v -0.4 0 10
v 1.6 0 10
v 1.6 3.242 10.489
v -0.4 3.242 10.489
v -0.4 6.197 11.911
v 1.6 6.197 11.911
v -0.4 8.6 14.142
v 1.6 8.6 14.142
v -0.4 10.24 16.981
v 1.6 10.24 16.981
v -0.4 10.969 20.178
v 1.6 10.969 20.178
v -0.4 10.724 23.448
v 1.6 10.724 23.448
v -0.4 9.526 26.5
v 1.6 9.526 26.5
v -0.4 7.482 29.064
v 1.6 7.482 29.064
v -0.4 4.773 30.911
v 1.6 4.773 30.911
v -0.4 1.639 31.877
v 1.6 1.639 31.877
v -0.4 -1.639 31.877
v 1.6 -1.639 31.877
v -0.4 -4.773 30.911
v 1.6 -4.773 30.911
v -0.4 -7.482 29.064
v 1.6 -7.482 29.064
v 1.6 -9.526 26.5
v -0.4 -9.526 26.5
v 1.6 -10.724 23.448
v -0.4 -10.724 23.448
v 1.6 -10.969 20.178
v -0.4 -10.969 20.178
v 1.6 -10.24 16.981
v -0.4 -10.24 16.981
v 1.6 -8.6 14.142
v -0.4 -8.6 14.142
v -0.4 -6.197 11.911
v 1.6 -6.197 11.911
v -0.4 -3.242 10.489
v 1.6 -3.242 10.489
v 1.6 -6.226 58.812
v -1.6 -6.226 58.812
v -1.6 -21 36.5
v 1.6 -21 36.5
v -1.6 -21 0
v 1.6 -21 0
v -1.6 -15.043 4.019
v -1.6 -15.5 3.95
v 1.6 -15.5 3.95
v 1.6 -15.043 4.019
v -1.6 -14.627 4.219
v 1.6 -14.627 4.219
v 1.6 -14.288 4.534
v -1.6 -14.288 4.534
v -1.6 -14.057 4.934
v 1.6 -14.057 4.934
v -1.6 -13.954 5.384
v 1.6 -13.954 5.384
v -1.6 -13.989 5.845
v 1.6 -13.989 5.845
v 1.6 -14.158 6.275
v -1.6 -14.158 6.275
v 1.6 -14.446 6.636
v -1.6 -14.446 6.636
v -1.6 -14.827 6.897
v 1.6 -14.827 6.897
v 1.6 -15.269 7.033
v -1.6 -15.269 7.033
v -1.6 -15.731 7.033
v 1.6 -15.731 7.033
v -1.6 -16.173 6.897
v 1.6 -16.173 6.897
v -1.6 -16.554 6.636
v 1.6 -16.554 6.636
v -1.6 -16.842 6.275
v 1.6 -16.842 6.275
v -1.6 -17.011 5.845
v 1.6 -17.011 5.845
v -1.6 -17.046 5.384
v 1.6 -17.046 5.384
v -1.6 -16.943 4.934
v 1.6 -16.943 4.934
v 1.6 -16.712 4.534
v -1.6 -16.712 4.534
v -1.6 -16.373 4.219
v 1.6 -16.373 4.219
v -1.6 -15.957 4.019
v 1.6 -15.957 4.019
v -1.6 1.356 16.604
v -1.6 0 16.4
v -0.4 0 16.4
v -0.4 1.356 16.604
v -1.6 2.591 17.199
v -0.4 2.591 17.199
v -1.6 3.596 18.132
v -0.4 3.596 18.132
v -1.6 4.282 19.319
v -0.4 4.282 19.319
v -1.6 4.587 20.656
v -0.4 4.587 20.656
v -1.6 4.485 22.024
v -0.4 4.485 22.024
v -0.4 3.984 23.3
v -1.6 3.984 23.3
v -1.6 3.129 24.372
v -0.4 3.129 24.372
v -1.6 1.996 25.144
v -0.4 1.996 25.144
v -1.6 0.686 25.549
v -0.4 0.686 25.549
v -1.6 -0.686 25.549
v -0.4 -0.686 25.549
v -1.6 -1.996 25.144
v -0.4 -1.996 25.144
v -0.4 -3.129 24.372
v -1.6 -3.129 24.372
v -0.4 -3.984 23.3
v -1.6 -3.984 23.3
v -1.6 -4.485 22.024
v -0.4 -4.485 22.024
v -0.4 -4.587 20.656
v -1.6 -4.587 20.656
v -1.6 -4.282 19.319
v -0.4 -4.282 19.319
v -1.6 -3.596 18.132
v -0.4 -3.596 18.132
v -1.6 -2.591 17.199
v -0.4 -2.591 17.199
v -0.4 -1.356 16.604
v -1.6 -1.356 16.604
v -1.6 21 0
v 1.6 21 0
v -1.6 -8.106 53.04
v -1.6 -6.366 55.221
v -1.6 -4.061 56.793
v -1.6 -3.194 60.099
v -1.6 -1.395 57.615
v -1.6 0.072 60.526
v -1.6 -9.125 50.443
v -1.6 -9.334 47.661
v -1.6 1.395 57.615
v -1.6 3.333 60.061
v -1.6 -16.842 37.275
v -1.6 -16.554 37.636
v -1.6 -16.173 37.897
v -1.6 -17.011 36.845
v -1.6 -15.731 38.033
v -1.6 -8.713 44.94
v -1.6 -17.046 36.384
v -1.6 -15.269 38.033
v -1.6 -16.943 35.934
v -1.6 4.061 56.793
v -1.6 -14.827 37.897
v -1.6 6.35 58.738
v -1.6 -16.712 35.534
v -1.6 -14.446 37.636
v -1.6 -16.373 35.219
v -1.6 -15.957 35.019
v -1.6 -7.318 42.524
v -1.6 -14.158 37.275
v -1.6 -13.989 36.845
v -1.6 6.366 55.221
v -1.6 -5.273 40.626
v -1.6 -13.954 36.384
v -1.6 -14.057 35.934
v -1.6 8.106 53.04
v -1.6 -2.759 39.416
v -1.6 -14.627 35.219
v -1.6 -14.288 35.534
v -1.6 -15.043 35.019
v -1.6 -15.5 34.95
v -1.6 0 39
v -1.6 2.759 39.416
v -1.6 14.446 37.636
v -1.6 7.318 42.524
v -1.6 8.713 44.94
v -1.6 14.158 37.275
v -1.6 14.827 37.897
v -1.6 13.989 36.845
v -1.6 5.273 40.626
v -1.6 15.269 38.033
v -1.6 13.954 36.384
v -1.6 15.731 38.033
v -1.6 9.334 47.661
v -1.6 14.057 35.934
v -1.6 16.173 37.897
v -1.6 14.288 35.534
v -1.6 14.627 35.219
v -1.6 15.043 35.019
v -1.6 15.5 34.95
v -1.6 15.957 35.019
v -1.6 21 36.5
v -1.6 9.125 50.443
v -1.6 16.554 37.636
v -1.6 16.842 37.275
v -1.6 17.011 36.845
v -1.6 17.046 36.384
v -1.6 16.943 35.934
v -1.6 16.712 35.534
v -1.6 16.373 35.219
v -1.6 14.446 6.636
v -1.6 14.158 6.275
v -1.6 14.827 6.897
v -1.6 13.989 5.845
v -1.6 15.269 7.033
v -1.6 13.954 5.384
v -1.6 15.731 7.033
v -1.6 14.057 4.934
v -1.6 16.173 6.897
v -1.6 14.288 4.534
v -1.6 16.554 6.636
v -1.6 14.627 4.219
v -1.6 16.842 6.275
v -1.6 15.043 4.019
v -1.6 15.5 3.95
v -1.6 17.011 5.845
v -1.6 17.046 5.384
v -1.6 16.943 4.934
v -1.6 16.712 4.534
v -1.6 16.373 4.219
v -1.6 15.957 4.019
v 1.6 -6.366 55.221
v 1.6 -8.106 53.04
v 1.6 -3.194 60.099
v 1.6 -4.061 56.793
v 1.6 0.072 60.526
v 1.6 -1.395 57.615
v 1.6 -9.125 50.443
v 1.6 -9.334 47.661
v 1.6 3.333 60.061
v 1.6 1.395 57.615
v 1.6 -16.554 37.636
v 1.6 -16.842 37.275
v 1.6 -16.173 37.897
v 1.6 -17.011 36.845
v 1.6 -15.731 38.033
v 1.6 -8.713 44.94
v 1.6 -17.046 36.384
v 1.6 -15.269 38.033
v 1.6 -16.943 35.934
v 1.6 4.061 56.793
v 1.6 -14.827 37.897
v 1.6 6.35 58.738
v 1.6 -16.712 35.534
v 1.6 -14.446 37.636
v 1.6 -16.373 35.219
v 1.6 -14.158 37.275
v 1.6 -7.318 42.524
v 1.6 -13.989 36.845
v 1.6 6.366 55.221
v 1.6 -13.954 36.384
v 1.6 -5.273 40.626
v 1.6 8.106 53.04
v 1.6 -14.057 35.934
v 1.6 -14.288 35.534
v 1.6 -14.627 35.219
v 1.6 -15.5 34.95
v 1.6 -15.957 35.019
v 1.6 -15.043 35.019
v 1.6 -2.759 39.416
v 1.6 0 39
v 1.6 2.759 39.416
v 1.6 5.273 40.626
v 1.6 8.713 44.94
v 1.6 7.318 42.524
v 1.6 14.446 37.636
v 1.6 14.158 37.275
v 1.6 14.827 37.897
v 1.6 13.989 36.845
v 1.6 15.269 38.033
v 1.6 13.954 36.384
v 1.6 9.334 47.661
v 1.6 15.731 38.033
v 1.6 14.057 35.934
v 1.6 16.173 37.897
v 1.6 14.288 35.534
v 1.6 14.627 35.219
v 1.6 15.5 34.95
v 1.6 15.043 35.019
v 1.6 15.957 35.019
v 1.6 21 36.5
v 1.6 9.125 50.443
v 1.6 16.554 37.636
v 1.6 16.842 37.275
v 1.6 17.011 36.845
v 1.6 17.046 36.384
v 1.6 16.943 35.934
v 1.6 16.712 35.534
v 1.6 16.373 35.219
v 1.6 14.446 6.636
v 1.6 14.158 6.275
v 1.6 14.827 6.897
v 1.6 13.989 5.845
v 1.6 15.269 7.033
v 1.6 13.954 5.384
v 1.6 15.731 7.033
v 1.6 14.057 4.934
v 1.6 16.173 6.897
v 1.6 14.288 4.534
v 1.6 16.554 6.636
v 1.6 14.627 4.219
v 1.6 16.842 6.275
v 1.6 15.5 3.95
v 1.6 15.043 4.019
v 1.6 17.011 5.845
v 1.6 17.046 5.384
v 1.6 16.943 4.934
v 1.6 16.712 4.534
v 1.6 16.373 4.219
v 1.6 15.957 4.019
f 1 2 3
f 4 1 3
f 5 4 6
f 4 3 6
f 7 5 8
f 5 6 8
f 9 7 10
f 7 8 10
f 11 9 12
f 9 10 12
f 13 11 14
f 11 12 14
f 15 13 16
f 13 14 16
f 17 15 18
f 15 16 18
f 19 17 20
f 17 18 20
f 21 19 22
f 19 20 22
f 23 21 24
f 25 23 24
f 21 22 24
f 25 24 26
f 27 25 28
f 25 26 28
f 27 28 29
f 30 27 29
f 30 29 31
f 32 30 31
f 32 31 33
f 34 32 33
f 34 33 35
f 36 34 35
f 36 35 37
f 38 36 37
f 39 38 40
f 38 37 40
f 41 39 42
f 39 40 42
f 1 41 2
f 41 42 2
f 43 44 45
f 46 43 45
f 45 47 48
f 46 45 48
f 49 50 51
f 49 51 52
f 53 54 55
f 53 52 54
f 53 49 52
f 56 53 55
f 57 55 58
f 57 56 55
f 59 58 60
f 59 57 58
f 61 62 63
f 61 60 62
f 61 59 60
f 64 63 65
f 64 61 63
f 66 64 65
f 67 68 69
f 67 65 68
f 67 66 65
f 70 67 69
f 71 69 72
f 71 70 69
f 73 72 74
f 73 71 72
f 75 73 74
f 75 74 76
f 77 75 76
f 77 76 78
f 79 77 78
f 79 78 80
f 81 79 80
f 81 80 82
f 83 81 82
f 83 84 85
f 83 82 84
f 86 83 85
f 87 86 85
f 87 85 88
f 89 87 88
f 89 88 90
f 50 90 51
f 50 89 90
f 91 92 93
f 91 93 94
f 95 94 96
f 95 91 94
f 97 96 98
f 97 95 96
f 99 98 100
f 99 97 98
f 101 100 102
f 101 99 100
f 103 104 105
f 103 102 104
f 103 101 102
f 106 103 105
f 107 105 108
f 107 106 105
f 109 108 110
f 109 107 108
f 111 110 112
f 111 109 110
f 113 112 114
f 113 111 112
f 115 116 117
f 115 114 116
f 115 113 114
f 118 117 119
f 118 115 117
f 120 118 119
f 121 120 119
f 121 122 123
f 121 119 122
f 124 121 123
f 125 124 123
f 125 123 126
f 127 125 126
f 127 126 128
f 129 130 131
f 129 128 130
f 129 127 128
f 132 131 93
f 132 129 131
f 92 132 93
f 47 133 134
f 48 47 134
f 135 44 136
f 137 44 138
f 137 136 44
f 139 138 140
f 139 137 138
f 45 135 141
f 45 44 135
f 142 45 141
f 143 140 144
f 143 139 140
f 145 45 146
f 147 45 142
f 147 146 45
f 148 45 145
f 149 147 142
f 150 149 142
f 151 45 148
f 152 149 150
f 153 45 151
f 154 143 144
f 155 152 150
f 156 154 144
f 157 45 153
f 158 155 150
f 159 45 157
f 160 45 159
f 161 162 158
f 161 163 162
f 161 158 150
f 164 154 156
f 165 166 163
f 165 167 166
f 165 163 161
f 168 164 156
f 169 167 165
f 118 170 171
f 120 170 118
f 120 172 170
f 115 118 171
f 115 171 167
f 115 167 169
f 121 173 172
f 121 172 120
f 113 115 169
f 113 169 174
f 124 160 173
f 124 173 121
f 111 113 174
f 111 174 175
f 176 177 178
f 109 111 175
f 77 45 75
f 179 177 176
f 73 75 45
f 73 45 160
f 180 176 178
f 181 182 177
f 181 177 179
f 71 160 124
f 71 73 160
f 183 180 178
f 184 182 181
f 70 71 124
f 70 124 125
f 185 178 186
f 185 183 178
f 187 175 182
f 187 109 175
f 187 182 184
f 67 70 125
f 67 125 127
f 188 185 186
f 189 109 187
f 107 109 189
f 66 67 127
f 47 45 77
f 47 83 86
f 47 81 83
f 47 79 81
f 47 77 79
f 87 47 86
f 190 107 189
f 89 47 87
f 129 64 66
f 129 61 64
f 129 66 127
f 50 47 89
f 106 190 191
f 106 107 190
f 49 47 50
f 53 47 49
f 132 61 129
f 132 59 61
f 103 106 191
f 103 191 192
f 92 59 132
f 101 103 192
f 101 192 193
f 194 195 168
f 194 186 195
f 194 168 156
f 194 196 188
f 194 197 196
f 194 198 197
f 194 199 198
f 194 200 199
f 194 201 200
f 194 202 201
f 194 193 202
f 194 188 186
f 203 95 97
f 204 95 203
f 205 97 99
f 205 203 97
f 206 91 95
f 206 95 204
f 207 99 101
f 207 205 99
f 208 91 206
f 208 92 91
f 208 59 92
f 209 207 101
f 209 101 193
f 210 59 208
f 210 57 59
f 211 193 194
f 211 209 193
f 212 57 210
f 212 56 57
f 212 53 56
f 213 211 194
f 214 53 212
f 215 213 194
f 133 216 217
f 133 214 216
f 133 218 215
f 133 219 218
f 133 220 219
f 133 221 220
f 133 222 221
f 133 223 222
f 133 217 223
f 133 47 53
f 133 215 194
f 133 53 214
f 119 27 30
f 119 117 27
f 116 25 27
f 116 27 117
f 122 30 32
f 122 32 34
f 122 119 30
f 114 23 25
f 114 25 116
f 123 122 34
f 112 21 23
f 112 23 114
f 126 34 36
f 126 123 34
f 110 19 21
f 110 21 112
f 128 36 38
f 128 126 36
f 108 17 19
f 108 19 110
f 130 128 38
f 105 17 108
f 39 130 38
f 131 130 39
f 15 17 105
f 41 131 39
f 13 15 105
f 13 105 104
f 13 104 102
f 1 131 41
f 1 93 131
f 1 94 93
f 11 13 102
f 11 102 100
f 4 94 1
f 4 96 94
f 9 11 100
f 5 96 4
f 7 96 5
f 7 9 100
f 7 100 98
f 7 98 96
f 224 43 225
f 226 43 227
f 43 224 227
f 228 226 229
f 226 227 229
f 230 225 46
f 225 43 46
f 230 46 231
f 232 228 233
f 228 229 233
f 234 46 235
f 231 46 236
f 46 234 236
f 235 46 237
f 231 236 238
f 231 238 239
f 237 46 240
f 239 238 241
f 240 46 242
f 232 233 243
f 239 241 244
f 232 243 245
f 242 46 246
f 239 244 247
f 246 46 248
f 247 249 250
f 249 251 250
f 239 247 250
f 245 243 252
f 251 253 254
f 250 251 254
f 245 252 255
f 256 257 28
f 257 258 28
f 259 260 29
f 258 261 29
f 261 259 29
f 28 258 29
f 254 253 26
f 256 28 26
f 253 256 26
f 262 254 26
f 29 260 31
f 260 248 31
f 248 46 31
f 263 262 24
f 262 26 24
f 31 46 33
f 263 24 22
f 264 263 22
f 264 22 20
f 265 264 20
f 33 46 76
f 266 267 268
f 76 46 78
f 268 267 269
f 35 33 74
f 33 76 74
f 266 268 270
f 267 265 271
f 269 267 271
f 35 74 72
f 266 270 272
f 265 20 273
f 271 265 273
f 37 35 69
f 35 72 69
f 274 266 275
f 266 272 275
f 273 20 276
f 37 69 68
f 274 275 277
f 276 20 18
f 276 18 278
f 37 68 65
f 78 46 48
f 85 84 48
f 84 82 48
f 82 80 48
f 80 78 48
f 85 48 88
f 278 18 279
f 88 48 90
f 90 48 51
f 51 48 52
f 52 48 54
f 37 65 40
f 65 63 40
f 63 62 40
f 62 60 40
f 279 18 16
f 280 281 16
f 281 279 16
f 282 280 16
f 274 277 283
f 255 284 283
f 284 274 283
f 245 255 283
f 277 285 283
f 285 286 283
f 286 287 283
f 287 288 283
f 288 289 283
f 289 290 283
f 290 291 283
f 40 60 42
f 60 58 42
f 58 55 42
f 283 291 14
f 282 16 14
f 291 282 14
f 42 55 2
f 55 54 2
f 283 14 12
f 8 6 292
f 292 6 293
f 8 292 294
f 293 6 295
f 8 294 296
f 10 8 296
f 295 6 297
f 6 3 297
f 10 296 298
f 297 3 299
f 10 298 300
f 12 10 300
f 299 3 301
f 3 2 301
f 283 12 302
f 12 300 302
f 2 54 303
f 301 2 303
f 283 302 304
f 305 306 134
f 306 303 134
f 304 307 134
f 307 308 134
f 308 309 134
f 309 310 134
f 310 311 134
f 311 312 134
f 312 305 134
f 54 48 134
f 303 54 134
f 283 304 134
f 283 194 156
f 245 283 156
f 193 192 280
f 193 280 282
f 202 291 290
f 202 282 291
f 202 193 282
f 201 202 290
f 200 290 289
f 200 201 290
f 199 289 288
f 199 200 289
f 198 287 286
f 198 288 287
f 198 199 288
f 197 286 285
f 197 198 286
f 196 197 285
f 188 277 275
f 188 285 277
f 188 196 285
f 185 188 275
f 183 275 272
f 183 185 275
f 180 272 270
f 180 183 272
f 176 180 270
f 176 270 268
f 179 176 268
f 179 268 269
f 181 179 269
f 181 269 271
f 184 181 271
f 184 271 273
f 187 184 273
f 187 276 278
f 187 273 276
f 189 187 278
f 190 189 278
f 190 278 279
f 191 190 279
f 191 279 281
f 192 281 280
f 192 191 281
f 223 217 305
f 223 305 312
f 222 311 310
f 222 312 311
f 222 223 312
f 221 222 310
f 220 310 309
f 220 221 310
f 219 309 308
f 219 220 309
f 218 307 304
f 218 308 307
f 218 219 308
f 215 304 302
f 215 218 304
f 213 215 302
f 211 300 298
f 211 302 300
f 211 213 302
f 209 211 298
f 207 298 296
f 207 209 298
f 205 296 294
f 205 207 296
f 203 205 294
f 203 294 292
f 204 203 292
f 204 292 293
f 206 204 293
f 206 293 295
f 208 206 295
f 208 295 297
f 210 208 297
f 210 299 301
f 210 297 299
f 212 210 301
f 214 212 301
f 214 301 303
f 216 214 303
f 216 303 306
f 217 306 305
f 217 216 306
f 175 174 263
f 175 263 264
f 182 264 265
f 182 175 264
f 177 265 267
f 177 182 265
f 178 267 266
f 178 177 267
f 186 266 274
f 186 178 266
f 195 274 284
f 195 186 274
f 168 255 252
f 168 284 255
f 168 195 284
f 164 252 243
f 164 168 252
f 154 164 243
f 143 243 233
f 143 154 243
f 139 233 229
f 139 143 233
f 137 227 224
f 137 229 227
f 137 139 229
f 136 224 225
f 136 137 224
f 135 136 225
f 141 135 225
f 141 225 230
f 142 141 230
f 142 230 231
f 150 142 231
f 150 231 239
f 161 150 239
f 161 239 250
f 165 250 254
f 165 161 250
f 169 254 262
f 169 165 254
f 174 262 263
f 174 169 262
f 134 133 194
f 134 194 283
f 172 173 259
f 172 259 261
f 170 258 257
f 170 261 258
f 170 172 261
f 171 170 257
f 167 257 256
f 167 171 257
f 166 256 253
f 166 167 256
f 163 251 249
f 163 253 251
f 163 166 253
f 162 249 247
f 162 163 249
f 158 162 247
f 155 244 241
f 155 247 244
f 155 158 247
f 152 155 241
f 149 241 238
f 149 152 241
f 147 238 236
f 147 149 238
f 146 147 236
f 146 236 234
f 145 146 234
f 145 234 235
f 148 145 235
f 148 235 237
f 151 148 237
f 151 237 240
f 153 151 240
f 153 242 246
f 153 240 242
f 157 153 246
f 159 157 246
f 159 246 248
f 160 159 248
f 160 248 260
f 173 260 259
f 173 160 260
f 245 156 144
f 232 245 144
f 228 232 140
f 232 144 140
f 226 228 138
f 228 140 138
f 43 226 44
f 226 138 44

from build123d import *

# Parameters (mm, degrees)
SKETCH1_W               = 3.2
SKETCH1_H               = 42
EXTRUDE1_DEPTH          = 75
CUT_EXTRUDE1_DEPTH      = 78.900962767
CUT_EXTRUDE1_DEPTH_BACK = 78.900962767
SKETCH2_R               = 1.55
SKETCH2_R_2             = 9.36
SKETCH2_R_3             = 4.6
SKETCH3_R               = 11
CUT_EXTRUDE2_DEPTH      = 2


with BuildPart() as part:
    # Sketch1 → Extrude1 (new body)
    with BuildSketch(Plane.XY):
        Rectangle(SKETCH1_W, SKETCH1_H)
    extrude(amount=EXTRUDE1_DEPTH)

    # Sketch2 → Cut-Extrude1 (cut, two sides: drawn at the far end of the back side and taken through both)
    with BuildSketch(Plane(origin=(0, 0, 0), x_dir=(0, 0, -1), z_dir=(1, 0, 0)).offset(-CUT_EXTRUDE1_DEPTH_BACK)):
        with Locations((-5.5, 15.5)):
            Circle(SKETCH2_R)
        with Locations((-5.5, -15.5)):
            Circle(SKETCH2_R)
        with Locations((-36.5, 15.5)):
            Circle(SKETCH2_R)
        with Locations((-36.5, -15.5)):
            Circle(SKETCH2_R)
        with Locations((-48.36, 0)):
            Circle(SKETCH2_R_2)
        with Locations((-21, 0)):
            Circle(SKETCH2_R_3)
        with BuildLine():
            Line((-36.5, 21), (-58.7375, 6.35))
            ThreePointArc((-58.7375, 6.35), (-60.525927164, 0.072266755), (-58.812204228, -6.226269591))
            Line((-58.812204228, -6.226269591), (-36.5, -21))
            Line((-36.5, -21), (-75, -21))
            Line((-75, -21), (-75, 21))
            Line((-75, 21), (-36.5, 21))
        make_face()
    extrude(amount=CUT_EXTRUDE1_DEPTH + CUT_EXTRUDE1_DEPTH_BACK, mode=Mode.SUBTRACT)

    # Sketch3 → Cut-Extrude2 (cut)
    with BuildSketch(Plane(origin=(1.6, 0, 0), x_dir=(0, 0, -1), z_dir=(1, 0, 0))):
        with Locations((-21, 0)):
            Circle(SKETCH3_R)
    extrude(amount=-CUT_EXTRUDE2_DEPTH, mode=Mode.SUBTRACT)


solid = part.part
